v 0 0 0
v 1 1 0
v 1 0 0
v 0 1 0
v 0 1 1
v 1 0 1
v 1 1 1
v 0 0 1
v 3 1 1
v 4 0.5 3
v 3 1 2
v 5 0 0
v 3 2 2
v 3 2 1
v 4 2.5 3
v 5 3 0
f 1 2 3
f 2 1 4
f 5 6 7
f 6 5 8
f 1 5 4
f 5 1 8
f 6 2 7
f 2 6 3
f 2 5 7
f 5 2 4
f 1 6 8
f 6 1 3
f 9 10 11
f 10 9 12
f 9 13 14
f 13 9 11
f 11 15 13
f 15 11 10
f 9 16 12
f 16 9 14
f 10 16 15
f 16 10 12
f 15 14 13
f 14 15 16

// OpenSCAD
// Part of the openscad_primtives library.

// Uses polyhedron to make a 6 face, 8 vertex solid. The solid is like a
// cube, except that each vertex can be moved to a different position, as
// long as 4 points describing each face remain on the same plane.
// 
// Call syntax:
// polycube( P )
// where P is a 2x2x2 array, where first dimension is along X, second along
// Y and third along Z. Element "0" in each dimension is the smaller on its
// edge, while "1" is larger on the edge.

// The only thing polycube really does is automate face construction, so
// there is no need to figure out clockwise vertex order for each face.

// The following array makes an unit cube and shows indices.

// P = [
// [
// [ [ 0, 0, 0 ], [ 0, 0, 1 ] ],
// [ [ 0, 1, 0 ], [ 0, 1, 1 ] ]
// ],
// [
// [ [ 1, 0, 0 ], [ 1, 0, 1 ] ],
// [ [ 1, 1, 0 ], [ 1, 1, 1 ] ]
// ] ] ;
 
// By Nenad Rijavec
 
// Feel free to use, modify and share as you see fit.


module polycube( P )
{
	vertices = [
		P[0][0][0],	// 0 - left near bottom
		P[0][1][0],	// 1 - left far bottom
		P[0][0][1],	// 2 - left near top
		P[0][1][1],	// 3 - left far top
		P[1][0][0],	// 4 - right near bottom
		P[1][1][0],	// 5 - right far bottom
		P[1][0][1],	// 6 - right near top
		P[1][1][1]	// 7 - right far top
	] ;
	poly_faces = [
		[ 1, 3, 2, 0 ], // left face
		[ 4, 6, 7, 5 ], // right face
		[ 4, 5, 1, 0 ],	// bottom face
		[ 2, 3, 7, 6 ],	// top face
		[ 0, 2, 6, 4 ], // near face
		[ 5, 7, 3, 1 ]	// far face
	] ;
	polyhedron( vertices, poly_faces ) ;
}

// examples

// unit cube to show indices
P = [
[
[ [ 0, 0, 0 ], [ 0, 0, 1 ] ],
[ [ 0, 1, 0 ], [ 0, 1, 1 ] ]
],
[
[ [ 1, 0, 0 ], [ 1, 0, 1 ] ],
[ [ 1, 1, 0 ], [ 1, 1, 1 ] ]
] ] ;

polycube( P ) ;

// shrunk left and top sides
Q = [
[
[ [ 1, 1, 1 ], [ 1, 1, 2 ] ],
[ [ 1, 2, 1 ], [ 1, 2, 2 ] ]
],
[
[ [ 3, 0, 0 ], [ 2, 0.5, 3 ] ],
[ [ 3, 3, 0 ], [ 2, 2.5, 3 ] ]
] ] ;
color( "red" ) 
translate( [ 2, 0, 0 ] ) polycube( Q ) ;
